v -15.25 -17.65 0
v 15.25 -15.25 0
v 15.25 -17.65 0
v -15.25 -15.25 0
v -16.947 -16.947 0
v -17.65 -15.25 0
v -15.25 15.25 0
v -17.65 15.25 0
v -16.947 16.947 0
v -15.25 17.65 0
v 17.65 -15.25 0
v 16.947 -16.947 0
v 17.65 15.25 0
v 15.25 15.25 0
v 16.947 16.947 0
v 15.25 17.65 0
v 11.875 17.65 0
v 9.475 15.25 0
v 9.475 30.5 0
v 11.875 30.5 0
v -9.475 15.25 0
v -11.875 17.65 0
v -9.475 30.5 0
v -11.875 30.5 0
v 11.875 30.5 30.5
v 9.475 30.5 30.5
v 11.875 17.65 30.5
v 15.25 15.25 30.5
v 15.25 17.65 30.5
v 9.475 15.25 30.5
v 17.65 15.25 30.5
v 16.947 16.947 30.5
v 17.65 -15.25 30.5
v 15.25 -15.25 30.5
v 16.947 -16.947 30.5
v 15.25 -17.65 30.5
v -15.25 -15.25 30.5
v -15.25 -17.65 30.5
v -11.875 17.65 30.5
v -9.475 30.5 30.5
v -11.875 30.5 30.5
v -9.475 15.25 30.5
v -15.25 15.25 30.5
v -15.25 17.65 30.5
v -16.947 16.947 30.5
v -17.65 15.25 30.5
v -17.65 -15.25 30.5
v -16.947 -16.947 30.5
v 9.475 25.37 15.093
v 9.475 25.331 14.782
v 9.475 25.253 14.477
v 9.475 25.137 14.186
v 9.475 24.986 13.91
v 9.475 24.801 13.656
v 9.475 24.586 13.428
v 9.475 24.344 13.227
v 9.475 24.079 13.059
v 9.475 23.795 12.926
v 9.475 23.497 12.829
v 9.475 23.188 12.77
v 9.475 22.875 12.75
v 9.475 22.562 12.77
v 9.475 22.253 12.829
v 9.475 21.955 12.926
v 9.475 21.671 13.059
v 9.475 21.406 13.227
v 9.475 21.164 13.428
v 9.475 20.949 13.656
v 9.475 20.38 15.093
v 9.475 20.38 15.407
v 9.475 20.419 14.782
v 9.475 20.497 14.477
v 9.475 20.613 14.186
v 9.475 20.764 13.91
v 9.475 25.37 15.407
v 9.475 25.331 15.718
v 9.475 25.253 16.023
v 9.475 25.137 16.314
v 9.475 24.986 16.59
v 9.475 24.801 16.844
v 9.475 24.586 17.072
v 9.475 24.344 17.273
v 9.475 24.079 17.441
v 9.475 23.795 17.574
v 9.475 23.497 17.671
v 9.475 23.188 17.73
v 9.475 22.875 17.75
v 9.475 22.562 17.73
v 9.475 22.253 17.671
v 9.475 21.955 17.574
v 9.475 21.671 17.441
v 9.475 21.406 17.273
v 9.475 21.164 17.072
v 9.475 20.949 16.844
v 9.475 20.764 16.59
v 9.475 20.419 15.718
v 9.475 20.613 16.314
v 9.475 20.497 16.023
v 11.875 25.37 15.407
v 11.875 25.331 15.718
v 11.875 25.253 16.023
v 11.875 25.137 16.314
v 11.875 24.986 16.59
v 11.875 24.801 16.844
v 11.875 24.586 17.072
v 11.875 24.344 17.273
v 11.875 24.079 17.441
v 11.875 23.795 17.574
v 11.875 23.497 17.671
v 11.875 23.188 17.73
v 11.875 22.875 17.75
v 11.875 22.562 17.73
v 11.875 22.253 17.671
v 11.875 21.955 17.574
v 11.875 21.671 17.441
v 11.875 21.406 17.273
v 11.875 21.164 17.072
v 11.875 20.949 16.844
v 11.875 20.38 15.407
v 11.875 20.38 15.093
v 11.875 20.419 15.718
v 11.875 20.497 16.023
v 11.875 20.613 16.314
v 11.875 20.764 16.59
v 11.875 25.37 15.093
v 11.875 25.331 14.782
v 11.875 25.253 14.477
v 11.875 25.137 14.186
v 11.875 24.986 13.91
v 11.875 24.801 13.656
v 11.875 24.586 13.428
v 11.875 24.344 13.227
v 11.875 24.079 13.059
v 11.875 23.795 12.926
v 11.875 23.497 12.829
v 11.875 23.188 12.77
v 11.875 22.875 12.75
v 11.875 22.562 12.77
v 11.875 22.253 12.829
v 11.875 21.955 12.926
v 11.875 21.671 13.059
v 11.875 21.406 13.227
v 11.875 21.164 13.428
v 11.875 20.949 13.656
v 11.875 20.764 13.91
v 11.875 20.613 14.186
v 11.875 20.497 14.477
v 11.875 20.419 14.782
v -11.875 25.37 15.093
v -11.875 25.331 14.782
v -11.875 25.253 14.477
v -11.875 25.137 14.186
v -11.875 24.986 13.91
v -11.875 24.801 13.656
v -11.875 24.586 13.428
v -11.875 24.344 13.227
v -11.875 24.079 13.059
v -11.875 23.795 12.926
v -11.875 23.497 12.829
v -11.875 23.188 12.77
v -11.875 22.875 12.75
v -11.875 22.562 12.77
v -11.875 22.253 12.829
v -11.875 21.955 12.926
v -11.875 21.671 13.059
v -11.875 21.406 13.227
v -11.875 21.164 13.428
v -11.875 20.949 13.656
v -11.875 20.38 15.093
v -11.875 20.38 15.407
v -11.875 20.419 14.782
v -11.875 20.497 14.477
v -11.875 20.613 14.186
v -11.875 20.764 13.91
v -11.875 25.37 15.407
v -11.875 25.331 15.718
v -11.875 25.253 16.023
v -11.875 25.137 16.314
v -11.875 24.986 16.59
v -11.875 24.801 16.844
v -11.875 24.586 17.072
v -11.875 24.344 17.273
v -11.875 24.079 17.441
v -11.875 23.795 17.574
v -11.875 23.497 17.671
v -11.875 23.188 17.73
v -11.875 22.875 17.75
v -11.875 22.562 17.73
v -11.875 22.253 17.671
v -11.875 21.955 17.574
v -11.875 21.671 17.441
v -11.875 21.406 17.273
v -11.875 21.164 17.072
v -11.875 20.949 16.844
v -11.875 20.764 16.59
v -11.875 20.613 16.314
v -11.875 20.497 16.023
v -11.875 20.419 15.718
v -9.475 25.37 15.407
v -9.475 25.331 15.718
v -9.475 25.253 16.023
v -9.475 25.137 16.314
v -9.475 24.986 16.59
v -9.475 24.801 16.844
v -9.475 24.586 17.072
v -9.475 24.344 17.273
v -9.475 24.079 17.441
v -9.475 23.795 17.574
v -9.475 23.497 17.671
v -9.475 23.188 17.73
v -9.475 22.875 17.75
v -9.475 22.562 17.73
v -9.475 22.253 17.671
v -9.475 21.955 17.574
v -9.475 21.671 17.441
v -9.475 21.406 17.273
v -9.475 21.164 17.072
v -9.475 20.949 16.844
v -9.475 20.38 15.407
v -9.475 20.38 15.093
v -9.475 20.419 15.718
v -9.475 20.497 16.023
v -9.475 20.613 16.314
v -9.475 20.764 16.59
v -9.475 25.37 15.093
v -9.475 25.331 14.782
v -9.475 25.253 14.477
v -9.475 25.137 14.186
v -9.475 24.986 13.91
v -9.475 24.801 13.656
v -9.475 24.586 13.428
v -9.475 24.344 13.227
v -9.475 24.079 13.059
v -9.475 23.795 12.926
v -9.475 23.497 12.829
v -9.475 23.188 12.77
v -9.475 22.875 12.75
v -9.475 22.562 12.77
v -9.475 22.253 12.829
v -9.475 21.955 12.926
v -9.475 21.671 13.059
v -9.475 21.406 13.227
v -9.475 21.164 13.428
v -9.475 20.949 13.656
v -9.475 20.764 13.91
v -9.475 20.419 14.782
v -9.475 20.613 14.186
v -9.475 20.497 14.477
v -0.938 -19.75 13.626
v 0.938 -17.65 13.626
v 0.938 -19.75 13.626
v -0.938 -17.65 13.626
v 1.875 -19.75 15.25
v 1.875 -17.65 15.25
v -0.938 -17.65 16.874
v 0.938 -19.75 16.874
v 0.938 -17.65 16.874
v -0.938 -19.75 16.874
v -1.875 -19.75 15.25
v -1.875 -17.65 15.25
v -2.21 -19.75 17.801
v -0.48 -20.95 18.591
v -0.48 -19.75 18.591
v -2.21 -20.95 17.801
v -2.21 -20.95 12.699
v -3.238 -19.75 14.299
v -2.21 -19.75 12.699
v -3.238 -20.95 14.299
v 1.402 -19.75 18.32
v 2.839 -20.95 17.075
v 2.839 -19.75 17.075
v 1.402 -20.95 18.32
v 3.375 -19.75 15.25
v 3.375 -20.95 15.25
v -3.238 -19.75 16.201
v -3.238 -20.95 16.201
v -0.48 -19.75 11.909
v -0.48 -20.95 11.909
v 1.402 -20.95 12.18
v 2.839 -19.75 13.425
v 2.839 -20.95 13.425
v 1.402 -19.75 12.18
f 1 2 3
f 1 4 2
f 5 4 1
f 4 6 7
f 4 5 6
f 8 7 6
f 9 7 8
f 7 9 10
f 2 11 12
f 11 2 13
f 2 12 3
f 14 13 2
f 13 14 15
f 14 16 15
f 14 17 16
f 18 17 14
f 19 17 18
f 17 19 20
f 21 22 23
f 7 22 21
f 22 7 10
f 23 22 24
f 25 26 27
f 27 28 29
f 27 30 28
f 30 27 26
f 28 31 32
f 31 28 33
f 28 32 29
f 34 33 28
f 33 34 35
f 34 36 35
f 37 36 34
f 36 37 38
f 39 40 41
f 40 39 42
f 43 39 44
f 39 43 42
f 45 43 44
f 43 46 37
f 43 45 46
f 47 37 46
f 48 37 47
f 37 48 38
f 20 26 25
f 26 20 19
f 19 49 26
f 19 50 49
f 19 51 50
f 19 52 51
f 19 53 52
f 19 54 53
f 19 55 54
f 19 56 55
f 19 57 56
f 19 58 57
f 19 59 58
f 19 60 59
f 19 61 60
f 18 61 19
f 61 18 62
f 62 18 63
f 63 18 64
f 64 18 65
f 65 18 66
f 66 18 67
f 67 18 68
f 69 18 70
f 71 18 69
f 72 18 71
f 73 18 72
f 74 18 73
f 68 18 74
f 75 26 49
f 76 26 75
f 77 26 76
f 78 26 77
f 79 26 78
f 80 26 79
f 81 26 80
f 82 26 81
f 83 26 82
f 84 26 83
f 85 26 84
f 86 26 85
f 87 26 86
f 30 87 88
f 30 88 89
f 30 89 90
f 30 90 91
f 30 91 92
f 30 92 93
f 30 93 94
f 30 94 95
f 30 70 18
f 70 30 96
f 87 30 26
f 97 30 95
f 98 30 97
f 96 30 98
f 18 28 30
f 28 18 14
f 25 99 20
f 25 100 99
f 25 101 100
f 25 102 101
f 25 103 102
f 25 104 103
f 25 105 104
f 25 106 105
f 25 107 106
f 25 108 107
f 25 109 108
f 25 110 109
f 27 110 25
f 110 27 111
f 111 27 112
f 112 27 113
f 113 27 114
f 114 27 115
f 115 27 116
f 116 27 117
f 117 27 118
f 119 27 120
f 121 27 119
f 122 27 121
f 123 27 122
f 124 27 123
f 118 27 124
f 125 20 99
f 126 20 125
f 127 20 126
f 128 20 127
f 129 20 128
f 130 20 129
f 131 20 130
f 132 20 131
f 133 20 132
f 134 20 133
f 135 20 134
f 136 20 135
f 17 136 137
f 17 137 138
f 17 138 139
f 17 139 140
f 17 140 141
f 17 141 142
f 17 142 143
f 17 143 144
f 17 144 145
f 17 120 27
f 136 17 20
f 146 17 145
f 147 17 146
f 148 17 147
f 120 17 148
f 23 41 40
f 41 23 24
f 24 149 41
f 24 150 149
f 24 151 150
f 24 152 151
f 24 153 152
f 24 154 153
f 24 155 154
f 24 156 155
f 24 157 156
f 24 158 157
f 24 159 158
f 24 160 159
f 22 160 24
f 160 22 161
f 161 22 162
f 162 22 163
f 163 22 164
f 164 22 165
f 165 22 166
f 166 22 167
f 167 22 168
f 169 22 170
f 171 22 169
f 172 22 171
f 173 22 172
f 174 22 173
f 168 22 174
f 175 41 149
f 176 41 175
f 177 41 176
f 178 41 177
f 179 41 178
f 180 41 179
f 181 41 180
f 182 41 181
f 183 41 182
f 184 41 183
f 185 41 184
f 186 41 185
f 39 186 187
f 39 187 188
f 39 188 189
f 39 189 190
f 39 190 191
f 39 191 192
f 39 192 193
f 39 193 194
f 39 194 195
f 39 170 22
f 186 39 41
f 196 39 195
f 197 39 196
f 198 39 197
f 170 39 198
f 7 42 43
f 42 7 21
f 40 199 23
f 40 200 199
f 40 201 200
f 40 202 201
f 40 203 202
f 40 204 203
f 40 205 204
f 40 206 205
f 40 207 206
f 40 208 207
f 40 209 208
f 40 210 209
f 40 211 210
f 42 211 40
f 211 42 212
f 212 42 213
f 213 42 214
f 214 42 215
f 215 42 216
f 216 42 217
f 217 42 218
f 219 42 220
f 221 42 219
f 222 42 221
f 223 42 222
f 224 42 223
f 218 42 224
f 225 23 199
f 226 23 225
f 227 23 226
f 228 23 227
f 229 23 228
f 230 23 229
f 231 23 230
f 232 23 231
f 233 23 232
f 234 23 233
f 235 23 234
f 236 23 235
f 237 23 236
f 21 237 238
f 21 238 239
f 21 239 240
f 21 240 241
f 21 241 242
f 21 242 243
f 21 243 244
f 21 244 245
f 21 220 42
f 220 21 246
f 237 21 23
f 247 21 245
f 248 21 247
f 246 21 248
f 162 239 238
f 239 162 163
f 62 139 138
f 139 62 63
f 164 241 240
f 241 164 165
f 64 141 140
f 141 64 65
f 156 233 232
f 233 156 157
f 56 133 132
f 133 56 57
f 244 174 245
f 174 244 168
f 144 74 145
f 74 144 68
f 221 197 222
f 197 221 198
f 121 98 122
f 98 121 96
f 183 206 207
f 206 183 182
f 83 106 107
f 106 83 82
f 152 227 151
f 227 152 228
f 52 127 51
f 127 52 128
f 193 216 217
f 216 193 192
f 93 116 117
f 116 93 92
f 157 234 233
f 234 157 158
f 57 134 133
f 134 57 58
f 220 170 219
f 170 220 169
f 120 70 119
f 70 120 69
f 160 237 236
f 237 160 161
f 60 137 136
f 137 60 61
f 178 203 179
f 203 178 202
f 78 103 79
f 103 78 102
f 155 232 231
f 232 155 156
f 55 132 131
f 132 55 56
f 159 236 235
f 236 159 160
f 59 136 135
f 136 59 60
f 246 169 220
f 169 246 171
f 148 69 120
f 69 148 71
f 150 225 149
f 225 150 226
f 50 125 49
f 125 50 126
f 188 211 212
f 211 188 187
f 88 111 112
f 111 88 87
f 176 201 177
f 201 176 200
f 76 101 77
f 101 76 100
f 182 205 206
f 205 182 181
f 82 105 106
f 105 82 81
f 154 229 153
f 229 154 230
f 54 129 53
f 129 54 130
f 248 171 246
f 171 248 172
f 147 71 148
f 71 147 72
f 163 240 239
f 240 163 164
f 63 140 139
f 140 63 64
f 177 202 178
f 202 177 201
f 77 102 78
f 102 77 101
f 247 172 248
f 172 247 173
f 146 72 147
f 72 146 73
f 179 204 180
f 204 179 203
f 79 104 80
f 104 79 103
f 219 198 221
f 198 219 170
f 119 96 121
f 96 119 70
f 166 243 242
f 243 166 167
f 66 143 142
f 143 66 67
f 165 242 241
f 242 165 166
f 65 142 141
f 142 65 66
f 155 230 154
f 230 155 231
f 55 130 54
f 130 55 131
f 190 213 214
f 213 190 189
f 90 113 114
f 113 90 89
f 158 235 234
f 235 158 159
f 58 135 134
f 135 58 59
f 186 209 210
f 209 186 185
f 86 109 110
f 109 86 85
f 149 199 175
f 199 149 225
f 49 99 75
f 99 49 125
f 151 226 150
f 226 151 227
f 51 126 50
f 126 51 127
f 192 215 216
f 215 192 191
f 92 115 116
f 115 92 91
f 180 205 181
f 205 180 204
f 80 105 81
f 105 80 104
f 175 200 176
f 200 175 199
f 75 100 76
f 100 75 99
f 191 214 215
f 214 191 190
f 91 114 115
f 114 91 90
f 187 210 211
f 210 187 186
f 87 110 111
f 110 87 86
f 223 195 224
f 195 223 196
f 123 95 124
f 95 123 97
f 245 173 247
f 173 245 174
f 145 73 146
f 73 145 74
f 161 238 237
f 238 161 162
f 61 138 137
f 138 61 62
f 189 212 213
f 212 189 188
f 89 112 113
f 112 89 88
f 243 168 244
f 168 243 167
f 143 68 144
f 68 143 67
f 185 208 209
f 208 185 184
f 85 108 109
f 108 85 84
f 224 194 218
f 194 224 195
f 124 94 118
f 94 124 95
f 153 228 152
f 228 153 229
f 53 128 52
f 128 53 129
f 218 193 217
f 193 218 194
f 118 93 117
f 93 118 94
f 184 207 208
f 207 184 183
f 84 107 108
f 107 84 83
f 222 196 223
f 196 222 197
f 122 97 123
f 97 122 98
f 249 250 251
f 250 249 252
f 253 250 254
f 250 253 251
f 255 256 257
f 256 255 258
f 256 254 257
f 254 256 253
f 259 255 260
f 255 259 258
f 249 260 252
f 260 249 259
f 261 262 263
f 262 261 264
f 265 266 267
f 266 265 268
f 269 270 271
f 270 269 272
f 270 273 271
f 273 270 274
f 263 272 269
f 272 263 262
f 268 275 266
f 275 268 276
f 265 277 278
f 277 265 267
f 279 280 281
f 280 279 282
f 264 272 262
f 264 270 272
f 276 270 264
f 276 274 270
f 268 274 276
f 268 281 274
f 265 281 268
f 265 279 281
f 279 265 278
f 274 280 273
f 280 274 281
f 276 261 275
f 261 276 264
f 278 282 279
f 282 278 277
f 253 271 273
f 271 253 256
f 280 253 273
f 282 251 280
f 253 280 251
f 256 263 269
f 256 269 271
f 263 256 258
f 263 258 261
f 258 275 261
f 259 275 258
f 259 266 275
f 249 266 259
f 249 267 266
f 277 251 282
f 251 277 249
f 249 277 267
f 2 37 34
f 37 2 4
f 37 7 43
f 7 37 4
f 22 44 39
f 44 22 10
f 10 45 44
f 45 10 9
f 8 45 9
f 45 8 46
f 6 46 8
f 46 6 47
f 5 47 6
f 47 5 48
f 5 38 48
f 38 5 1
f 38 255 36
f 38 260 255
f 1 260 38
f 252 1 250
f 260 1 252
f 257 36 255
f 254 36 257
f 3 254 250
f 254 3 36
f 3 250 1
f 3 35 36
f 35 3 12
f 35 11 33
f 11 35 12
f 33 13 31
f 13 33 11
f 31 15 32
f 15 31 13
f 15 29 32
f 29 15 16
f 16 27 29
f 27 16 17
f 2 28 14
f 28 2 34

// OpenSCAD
size = 30.5;
thread = 0.4;
thickness = 6;
inset = size * 0.15;
length = size / 2;
screw_d = 5;

offset_ = thread * thickness;

inner_screw = 3.75;
outer_cylinder = 6.75;
nail_head = thread * 3; // 1.2 mm
nail_length = 3;        // 3 mm until head

union()
{
    linear_extrude(size)
    {
        difference()
        {
            offset(offset_)
            {
                square(size = size, center = true);
            }
            square(size = size, center = true);
            hull()
            {
                translate([ (size / 2) - (inset), size - (length / 2) ])
                {
                    square([ offset_, length ], center = true);
                };
                translate([ -((size / 2) - (inset)), size - (length / 2) ])
                {
                    square([ offset_, length ], center = true);
                };
            }
        }
    }

    difference()
    {
        linear_extrude(size)
        {
            translate([ (size / 2) - (inset), size - (length / 2) ])
            {
                square([ offset_, length ], center = true);
            };
            translate([ -((size / 2) - (inset)), size - (length / 2) ])
            {
                square([ offset_, length ], center = true);
            };
        };
        translate([ 0, (size / 2) + (length / 2), size / 2 ])
        {
            rotate([ 0, 90, 0 ])
            {
                cylinder(h = size, r = screw_d / 2, center = true, $fn = 50);
            }
        }
    }
    {
        translate([ 0, -((size / 2) + (offset_ * 1.5)), size / 2 ])
        {
            rotate([ 90, 0, 0 ])
            {
                union()
                {
                    cylinder(h = nail_length, d = inner_screw, center = true);
                    translate([ 0, 0, nail_length / 2 ])
                    {
                        cylinder(h = nail_head, d = outer_cylinder, center = true);
                    }
                }
            }
        }
    }
}
